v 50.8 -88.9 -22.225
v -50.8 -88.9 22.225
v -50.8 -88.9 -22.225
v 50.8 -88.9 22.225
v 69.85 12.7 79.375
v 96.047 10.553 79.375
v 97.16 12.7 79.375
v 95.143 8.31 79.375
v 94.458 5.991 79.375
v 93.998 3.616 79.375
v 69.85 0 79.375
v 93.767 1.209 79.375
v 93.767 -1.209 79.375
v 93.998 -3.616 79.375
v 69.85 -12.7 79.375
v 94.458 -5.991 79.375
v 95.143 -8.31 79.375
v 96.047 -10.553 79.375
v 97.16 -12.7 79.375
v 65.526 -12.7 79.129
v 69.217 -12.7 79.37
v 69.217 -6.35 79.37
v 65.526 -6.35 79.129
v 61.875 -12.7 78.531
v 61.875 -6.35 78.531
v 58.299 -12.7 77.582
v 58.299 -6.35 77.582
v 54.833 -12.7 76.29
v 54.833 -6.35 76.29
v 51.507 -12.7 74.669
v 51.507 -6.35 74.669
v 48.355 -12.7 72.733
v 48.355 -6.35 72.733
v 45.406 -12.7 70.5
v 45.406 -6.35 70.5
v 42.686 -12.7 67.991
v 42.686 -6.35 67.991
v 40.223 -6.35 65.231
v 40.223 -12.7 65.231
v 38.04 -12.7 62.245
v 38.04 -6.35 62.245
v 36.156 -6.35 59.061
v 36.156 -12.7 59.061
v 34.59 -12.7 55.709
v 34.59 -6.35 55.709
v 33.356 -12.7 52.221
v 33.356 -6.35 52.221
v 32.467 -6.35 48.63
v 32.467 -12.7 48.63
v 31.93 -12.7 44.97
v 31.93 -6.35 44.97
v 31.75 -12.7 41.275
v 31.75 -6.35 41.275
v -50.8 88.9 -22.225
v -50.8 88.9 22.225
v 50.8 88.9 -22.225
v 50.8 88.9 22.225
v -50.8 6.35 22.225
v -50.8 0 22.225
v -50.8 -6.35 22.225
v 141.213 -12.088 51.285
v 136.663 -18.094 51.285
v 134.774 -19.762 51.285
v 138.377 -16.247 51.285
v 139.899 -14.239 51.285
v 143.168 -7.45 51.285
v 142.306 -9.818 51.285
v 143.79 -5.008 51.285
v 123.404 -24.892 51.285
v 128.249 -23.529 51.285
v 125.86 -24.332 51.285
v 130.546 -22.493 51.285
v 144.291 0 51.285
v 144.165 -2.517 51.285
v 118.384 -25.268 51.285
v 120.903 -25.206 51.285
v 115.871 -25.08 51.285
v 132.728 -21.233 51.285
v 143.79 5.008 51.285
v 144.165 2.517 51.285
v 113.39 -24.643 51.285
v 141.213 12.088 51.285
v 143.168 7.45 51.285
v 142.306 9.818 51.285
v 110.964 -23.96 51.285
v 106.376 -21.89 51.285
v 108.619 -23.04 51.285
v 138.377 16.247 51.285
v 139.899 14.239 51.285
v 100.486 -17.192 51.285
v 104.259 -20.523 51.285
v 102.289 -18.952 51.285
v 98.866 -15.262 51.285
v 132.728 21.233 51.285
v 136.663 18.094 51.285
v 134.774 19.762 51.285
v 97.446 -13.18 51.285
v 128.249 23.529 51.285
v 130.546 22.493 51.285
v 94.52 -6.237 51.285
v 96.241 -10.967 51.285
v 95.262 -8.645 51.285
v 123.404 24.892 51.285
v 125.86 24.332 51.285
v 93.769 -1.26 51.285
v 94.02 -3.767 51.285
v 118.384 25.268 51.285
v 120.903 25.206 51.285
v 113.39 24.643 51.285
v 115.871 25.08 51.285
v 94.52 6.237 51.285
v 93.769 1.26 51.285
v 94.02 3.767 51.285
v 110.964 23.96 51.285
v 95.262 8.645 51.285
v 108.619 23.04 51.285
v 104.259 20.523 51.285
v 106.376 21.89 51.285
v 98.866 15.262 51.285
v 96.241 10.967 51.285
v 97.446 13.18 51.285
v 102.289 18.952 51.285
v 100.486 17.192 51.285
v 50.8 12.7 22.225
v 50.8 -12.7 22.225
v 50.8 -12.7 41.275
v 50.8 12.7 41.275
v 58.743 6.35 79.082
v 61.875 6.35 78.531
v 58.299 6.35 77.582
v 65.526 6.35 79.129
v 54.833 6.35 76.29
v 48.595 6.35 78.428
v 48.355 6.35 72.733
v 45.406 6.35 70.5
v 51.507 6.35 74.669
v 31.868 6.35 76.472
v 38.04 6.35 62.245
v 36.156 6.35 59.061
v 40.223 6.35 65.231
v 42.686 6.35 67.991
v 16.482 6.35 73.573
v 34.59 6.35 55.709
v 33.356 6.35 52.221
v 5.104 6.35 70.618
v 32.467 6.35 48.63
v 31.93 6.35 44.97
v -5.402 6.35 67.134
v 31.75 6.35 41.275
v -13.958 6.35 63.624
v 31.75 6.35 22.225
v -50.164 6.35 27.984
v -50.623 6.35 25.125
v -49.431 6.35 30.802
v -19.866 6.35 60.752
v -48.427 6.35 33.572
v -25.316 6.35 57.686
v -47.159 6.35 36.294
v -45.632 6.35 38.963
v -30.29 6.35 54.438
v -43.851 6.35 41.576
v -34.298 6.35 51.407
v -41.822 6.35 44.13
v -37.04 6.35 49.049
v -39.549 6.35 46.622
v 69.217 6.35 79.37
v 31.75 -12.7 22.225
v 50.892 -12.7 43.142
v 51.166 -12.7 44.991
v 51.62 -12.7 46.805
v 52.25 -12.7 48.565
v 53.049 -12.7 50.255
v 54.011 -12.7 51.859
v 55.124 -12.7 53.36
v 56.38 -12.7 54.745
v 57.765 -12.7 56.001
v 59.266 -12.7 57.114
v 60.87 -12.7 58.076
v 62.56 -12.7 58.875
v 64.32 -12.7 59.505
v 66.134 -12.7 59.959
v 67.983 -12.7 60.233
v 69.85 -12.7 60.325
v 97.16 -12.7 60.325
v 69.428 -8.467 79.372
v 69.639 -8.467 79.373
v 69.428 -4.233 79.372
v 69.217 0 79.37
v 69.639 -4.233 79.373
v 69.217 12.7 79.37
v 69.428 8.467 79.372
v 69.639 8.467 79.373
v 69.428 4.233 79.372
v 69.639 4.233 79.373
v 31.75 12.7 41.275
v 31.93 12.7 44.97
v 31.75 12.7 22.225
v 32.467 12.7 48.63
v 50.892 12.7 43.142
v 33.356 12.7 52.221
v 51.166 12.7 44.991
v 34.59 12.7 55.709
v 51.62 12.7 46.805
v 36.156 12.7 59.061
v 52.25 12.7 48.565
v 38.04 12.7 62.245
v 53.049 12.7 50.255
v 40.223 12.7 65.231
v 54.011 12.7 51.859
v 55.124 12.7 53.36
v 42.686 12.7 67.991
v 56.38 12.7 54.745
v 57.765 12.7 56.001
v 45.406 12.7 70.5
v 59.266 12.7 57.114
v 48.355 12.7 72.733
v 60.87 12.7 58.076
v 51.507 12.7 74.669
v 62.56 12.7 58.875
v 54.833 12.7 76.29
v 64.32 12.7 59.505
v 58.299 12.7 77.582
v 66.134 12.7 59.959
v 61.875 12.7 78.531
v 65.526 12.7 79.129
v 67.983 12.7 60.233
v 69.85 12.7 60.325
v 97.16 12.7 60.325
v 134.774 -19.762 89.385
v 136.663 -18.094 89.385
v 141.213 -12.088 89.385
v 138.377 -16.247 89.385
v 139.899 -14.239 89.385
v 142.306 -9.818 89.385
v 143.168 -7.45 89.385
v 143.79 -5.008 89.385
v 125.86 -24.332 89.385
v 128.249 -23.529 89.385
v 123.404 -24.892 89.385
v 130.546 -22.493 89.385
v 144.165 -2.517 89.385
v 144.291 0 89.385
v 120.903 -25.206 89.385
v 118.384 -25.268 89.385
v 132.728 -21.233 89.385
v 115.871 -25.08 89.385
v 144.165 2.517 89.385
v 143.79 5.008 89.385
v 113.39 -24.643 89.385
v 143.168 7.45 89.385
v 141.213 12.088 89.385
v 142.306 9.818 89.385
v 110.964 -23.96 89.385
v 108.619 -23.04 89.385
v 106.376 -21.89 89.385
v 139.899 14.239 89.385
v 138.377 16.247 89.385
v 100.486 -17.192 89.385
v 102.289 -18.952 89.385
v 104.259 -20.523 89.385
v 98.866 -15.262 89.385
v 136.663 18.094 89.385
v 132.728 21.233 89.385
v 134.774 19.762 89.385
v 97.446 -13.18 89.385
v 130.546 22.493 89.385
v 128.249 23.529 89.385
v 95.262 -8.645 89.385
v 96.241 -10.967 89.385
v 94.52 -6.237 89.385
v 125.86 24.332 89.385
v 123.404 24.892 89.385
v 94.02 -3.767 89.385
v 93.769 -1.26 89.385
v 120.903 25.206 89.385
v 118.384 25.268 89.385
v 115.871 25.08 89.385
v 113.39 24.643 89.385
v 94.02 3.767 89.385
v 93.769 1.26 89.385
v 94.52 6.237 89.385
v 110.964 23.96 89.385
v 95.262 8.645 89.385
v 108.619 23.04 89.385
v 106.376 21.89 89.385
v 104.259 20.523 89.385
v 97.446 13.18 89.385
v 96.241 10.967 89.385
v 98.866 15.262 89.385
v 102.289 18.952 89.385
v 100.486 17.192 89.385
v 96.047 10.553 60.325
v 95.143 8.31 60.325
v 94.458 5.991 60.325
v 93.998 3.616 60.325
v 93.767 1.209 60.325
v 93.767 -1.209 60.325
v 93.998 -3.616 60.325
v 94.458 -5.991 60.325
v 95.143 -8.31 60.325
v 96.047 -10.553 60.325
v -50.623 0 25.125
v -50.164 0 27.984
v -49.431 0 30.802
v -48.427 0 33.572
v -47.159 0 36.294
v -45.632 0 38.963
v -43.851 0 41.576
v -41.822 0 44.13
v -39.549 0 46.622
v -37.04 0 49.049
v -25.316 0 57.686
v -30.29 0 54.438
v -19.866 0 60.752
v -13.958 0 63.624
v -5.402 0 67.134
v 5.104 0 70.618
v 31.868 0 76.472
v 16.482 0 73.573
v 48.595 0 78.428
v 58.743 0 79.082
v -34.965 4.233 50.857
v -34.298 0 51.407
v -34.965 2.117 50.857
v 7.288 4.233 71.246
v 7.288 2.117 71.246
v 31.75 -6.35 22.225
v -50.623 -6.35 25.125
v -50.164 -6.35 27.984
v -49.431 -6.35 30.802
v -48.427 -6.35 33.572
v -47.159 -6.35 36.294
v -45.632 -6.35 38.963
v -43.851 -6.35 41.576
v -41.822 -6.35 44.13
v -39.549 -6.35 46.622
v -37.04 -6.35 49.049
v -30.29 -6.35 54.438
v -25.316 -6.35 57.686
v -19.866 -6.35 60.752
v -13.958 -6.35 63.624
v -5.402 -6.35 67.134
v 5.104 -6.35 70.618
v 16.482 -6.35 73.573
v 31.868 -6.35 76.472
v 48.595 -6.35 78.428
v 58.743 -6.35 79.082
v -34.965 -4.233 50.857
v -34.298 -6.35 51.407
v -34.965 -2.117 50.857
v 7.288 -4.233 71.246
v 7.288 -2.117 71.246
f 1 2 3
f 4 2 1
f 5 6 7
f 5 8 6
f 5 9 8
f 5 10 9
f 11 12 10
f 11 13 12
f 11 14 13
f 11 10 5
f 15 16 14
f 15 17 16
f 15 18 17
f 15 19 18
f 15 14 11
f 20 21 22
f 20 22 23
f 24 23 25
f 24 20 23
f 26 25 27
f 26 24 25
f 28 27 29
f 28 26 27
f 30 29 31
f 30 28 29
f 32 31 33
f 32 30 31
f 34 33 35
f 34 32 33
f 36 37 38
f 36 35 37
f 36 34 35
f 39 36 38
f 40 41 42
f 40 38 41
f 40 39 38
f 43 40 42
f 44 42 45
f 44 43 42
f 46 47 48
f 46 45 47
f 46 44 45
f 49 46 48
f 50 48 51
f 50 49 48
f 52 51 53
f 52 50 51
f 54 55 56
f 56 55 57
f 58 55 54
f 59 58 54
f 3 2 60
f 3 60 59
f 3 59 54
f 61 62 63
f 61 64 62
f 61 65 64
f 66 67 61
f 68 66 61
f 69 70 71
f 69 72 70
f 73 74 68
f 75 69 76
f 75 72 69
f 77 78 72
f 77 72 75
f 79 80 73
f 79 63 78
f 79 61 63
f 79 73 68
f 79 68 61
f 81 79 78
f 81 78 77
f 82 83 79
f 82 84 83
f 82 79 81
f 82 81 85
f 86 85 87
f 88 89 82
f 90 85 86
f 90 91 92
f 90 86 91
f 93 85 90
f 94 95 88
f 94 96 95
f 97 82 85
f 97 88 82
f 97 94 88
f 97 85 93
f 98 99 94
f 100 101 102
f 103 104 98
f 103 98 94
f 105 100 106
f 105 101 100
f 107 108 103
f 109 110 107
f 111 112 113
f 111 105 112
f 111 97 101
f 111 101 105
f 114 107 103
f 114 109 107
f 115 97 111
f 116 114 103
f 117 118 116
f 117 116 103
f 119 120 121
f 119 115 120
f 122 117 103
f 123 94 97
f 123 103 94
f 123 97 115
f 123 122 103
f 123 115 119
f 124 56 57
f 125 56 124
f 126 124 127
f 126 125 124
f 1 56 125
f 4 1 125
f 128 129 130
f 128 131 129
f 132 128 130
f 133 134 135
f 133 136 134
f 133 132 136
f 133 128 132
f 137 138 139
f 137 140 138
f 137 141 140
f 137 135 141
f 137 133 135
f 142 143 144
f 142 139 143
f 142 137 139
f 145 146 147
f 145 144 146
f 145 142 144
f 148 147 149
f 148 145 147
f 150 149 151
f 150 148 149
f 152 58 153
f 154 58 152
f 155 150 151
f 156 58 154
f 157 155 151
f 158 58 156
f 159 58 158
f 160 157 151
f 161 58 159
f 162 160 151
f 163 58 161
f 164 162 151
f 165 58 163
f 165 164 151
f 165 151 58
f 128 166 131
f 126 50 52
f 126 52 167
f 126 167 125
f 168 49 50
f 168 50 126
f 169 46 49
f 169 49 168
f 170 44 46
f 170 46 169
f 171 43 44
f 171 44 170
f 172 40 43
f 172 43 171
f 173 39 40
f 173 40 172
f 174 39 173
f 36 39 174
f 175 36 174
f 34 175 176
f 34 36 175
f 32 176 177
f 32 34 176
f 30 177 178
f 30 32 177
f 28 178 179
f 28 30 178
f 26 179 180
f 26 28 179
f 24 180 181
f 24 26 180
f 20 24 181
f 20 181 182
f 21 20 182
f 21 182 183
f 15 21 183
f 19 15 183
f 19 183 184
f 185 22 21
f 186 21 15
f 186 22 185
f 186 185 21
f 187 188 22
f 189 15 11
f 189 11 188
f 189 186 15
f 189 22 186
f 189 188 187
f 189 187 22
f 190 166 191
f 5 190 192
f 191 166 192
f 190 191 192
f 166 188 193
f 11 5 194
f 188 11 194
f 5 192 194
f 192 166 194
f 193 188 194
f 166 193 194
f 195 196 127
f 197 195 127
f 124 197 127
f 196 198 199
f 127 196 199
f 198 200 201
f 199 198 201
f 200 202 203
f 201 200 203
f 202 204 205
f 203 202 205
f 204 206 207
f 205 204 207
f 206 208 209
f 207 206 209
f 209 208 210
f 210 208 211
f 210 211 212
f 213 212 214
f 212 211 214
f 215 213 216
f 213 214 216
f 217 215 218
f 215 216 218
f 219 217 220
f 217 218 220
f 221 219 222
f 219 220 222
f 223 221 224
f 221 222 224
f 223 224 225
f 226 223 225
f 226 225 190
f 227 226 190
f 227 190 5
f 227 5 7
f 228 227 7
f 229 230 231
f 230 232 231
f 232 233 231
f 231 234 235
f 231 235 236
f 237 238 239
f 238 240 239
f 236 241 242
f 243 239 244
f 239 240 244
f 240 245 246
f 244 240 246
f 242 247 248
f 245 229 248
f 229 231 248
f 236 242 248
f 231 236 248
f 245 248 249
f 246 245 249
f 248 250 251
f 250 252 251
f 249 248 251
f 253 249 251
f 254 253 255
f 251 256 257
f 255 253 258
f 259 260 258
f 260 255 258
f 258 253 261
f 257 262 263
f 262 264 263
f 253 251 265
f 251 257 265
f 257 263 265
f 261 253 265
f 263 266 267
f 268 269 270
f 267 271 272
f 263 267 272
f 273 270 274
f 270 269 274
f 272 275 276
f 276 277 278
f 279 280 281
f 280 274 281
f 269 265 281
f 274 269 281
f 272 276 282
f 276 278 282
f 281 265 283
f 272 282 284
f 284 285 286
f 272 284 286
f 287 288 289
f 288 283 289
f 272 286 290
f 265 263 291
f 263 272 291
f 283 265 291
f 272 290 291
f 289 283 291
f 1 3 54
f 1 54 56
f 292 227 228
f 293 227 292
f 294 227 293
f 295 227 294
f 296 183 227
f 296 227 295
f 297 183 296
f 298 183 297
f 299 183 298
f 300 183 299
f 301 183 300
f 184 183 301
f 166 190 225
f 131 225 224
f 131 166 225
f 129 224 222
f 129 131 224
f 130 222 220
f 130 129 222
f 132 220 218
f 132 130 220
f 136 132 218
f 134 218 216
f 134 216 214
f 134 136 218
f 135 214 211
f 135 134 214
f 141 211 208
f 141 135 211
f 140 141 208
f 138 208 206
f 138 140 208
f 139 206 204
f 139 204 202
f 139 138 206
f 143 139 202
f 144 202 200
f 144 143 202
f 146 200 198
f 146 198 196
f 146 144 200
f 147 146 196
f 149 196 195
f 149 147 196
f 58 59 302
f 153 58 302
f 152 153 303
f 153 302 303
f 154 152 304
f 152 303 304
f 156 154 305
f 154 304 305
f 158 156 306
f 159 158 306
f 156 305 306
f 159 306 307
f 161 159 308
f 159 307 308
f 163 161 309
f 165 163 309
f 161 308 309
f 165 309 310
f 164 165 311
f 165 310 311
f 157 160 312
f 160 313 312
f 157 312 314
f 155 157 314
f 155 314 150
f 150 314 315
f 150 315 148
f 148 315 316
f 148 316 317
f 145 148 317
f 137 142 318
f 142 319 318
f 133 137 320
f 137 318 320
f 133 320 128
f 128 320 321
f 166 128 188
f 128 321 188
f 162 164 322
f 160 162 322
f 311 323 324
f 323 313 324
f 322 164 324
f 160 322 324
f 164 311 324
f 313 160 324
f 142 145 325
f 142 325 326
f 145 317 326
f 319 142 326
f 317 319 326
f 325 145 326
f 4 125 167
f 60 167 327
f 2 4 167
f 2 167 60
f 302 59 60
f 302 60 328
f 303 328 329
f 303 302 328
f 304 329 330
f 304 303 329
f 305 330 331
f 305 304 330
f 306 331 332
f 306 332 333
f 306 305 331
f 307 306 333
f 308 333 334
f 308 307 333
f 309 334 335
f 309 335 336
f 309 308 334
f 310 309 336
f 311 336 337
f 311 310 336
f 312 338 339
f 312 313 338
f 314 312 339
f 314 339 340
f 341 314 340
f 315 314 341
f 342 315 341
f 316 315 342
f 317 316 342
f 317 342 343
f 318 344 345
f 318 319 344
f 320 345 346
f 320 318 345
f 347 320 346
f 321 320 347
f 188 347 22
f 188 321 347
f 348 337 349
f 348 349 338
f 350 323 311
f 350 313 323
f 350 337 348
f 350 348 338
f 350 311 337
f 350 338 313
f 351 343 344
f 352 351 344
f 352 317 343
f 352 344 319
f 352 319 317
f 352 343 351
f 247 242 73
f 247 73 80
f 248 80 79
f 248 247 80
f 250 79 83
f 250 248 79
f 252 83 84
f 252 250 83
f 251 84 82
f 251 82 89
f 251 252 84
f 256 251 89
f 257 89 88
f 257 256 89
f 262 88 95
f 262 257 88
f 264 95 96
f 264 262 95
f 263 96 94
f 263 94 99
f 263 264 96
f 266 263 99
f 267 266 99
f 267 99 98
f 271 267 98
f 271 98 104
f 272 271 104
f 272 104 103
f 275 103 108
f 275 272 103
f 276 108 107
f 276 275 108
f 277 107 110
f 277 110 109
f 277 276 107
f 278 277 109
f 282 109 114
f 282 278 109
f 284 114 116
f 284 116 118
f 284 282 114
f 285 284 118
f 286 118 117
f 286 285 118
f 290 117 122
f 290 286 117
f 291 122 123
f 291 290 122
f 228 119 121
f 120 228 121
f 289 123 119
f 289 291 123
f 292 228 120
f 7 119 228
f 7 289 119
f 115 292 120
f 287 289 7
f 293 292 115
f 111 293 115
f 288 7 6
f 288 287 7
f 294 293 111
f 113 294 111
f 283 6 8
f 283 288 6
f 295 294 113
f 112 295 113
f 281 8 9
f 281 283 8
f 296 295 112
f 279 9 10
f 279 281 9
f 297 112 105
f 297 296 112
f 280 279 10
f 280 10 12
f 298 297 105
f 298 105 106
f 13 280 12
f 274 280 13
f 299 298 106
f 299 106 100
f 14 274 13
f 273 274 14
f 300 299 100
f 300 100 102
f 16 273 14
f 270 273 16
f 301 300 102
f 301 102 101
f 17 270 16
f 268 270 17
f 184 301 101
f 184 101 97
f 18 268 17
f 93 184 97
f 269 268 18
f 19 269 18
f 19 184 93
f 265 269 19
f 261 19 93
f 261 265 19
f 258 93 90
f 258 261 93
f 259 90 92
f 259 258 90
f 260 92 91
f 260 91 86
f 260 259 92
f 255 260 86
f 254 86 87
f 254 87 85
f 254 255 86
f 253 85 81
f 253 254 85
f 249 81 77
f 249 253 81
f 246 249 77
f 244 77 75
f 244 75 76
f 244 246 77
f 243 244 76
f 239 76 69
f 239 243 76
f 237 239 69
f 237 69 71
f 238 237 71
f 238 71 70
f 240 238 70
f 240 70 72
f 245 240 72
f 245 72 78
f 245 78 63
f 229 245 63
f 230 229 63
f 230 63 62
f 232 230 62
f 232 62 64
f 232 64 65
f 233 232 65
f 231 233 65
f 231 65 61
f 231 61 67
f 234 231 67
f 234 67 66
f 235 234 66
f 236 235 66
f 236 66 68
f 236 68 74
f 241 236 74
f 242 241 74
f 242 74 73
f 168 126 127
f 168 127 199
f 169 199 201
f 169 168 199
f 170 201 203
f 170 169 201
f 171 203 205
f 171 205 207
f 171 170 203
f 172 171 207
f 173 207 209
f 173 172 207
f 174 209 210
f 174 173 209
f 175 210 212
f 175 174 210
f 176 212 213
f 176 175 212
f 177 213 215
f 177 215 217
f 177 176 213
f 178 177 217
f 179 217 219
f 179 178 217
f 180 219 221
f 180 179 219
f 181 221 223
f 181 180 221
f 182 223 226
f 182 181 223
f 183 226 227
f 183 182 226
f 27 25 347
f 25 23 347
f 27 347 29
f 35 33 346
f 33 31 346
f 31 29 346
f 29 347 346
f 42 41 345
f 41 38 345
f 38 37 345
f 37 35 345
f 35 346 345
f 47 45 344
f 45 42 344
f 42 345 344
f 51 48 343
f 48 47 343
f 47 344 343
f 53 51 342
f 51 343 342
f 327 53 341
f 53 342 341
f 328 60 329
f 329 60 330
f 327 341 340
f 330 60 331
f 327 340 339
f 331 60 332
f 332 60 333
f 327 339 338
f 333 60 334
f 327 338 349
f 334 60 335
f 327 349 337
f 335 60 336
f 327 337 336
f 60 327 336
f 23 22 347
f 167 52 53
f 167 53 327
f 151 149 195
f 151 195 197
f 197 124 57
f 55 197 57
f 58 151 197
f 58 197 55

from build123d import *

# Parameters (mm, degrees)
F1_DEPTH = 88.9
F2_DEPTH = 6.35
F3_DEPTH = 12.7
F0_W     = 25.2763175084
F0_H     = 38.1


with BuildPart() as f1:
    # F0 (on Front) → F1 (new body, symmetric)
    with BuildSketch(Plane.XZ):
        Polygon((31.75, 22.225), (-50.8, 22.225), (-50.8, -22.225), (50.8, -22.225), (50.8, 22.225), align=None)
    extrude(amount=F1_DEPTH, both=True)

    # F0 (on Front) → F2 (join, symmetric)
    with BuildSketch(Plane.XZ):
        with BuildLine():
            add(Edge.make_bspline(
                [(-50.8, 22.225), (-50.420176295, 53.6387471007), (-0.3042402085, 78.7179242207), (69.217346781, 79.3697470119)],
                knots=[0, 0, 0, 0, 133.0977115432, 133.0977115432, 133.0977115432, 133.0977115432], degree=3))
            Line((-50.8, 22.225), (31.75, 22.225))
            Line((31.75, 22.225), (31.75, 41.275))
            ThreePointArc((31.75, 41.275), (42.6864758578, 67.9911553405), (69.217346781, 79.3697470119))
        make_face()
    extrude(amount=F2_DEPTH, both=True)

    # F0 (on Front) → F3 (join, symmetric)
    with BuildSketch(Plane.XZ):
        with BuildLine():
            Line((31.75, 41.275), (31.75, 22.225))
            Line((31.75, 22.225), (50.8, 22.225))
            Line((50.8, 22.225), (50.8, 41.275))
            ThreePointArc((50.8, 41.275), (56.3796158184, 54.7453841816), (69.85, 60.325))
            Line((69.85, 60.325), (93.4907073213, 60.325))
            Line((93.4907073213, 60.325), (93.4907073213, 79.375))
            Line((93.4907073213, 79.375), (69.85, 79.375))
            add(Edge.make_bspline(
                [(69.217346781, 79.3697470119), (69.4280532127, 79.3717225603), (69.6389379005, 79.3734737242), (69.85, 79.375)],
                knots=[133.0977115432, 133.0977115432, 133.0977115432, 133.0977115432, 133.5011048643, 133.5011048643, 133.5011048643, 133.5011048643], degree=3))
            ThreePointArc((69.217346781, 79.3697470119), (42.6864758578, 67.9911553405), (31.75, 41.275))
        make_face()
        Polygon((118.732270607, 79.375), (93.4907073213, 79.375), (93.4907073213, 60.325), (119.0067035424, 60.325), align=None)
    extrude(amount=F3_DEPTH, both=True)

    # F0 (on Front) → F4 (revolve)
    with BuildSketch(Plane.XZ):
        with Locations((131.6525485671, 70.3345479765)):
            Rectangle(F0_W, F0_H)
    revolve(axis=Axis((119.0143898129, 0, 70.3345479765), (0, 0, 1)))


solid = f1.part
